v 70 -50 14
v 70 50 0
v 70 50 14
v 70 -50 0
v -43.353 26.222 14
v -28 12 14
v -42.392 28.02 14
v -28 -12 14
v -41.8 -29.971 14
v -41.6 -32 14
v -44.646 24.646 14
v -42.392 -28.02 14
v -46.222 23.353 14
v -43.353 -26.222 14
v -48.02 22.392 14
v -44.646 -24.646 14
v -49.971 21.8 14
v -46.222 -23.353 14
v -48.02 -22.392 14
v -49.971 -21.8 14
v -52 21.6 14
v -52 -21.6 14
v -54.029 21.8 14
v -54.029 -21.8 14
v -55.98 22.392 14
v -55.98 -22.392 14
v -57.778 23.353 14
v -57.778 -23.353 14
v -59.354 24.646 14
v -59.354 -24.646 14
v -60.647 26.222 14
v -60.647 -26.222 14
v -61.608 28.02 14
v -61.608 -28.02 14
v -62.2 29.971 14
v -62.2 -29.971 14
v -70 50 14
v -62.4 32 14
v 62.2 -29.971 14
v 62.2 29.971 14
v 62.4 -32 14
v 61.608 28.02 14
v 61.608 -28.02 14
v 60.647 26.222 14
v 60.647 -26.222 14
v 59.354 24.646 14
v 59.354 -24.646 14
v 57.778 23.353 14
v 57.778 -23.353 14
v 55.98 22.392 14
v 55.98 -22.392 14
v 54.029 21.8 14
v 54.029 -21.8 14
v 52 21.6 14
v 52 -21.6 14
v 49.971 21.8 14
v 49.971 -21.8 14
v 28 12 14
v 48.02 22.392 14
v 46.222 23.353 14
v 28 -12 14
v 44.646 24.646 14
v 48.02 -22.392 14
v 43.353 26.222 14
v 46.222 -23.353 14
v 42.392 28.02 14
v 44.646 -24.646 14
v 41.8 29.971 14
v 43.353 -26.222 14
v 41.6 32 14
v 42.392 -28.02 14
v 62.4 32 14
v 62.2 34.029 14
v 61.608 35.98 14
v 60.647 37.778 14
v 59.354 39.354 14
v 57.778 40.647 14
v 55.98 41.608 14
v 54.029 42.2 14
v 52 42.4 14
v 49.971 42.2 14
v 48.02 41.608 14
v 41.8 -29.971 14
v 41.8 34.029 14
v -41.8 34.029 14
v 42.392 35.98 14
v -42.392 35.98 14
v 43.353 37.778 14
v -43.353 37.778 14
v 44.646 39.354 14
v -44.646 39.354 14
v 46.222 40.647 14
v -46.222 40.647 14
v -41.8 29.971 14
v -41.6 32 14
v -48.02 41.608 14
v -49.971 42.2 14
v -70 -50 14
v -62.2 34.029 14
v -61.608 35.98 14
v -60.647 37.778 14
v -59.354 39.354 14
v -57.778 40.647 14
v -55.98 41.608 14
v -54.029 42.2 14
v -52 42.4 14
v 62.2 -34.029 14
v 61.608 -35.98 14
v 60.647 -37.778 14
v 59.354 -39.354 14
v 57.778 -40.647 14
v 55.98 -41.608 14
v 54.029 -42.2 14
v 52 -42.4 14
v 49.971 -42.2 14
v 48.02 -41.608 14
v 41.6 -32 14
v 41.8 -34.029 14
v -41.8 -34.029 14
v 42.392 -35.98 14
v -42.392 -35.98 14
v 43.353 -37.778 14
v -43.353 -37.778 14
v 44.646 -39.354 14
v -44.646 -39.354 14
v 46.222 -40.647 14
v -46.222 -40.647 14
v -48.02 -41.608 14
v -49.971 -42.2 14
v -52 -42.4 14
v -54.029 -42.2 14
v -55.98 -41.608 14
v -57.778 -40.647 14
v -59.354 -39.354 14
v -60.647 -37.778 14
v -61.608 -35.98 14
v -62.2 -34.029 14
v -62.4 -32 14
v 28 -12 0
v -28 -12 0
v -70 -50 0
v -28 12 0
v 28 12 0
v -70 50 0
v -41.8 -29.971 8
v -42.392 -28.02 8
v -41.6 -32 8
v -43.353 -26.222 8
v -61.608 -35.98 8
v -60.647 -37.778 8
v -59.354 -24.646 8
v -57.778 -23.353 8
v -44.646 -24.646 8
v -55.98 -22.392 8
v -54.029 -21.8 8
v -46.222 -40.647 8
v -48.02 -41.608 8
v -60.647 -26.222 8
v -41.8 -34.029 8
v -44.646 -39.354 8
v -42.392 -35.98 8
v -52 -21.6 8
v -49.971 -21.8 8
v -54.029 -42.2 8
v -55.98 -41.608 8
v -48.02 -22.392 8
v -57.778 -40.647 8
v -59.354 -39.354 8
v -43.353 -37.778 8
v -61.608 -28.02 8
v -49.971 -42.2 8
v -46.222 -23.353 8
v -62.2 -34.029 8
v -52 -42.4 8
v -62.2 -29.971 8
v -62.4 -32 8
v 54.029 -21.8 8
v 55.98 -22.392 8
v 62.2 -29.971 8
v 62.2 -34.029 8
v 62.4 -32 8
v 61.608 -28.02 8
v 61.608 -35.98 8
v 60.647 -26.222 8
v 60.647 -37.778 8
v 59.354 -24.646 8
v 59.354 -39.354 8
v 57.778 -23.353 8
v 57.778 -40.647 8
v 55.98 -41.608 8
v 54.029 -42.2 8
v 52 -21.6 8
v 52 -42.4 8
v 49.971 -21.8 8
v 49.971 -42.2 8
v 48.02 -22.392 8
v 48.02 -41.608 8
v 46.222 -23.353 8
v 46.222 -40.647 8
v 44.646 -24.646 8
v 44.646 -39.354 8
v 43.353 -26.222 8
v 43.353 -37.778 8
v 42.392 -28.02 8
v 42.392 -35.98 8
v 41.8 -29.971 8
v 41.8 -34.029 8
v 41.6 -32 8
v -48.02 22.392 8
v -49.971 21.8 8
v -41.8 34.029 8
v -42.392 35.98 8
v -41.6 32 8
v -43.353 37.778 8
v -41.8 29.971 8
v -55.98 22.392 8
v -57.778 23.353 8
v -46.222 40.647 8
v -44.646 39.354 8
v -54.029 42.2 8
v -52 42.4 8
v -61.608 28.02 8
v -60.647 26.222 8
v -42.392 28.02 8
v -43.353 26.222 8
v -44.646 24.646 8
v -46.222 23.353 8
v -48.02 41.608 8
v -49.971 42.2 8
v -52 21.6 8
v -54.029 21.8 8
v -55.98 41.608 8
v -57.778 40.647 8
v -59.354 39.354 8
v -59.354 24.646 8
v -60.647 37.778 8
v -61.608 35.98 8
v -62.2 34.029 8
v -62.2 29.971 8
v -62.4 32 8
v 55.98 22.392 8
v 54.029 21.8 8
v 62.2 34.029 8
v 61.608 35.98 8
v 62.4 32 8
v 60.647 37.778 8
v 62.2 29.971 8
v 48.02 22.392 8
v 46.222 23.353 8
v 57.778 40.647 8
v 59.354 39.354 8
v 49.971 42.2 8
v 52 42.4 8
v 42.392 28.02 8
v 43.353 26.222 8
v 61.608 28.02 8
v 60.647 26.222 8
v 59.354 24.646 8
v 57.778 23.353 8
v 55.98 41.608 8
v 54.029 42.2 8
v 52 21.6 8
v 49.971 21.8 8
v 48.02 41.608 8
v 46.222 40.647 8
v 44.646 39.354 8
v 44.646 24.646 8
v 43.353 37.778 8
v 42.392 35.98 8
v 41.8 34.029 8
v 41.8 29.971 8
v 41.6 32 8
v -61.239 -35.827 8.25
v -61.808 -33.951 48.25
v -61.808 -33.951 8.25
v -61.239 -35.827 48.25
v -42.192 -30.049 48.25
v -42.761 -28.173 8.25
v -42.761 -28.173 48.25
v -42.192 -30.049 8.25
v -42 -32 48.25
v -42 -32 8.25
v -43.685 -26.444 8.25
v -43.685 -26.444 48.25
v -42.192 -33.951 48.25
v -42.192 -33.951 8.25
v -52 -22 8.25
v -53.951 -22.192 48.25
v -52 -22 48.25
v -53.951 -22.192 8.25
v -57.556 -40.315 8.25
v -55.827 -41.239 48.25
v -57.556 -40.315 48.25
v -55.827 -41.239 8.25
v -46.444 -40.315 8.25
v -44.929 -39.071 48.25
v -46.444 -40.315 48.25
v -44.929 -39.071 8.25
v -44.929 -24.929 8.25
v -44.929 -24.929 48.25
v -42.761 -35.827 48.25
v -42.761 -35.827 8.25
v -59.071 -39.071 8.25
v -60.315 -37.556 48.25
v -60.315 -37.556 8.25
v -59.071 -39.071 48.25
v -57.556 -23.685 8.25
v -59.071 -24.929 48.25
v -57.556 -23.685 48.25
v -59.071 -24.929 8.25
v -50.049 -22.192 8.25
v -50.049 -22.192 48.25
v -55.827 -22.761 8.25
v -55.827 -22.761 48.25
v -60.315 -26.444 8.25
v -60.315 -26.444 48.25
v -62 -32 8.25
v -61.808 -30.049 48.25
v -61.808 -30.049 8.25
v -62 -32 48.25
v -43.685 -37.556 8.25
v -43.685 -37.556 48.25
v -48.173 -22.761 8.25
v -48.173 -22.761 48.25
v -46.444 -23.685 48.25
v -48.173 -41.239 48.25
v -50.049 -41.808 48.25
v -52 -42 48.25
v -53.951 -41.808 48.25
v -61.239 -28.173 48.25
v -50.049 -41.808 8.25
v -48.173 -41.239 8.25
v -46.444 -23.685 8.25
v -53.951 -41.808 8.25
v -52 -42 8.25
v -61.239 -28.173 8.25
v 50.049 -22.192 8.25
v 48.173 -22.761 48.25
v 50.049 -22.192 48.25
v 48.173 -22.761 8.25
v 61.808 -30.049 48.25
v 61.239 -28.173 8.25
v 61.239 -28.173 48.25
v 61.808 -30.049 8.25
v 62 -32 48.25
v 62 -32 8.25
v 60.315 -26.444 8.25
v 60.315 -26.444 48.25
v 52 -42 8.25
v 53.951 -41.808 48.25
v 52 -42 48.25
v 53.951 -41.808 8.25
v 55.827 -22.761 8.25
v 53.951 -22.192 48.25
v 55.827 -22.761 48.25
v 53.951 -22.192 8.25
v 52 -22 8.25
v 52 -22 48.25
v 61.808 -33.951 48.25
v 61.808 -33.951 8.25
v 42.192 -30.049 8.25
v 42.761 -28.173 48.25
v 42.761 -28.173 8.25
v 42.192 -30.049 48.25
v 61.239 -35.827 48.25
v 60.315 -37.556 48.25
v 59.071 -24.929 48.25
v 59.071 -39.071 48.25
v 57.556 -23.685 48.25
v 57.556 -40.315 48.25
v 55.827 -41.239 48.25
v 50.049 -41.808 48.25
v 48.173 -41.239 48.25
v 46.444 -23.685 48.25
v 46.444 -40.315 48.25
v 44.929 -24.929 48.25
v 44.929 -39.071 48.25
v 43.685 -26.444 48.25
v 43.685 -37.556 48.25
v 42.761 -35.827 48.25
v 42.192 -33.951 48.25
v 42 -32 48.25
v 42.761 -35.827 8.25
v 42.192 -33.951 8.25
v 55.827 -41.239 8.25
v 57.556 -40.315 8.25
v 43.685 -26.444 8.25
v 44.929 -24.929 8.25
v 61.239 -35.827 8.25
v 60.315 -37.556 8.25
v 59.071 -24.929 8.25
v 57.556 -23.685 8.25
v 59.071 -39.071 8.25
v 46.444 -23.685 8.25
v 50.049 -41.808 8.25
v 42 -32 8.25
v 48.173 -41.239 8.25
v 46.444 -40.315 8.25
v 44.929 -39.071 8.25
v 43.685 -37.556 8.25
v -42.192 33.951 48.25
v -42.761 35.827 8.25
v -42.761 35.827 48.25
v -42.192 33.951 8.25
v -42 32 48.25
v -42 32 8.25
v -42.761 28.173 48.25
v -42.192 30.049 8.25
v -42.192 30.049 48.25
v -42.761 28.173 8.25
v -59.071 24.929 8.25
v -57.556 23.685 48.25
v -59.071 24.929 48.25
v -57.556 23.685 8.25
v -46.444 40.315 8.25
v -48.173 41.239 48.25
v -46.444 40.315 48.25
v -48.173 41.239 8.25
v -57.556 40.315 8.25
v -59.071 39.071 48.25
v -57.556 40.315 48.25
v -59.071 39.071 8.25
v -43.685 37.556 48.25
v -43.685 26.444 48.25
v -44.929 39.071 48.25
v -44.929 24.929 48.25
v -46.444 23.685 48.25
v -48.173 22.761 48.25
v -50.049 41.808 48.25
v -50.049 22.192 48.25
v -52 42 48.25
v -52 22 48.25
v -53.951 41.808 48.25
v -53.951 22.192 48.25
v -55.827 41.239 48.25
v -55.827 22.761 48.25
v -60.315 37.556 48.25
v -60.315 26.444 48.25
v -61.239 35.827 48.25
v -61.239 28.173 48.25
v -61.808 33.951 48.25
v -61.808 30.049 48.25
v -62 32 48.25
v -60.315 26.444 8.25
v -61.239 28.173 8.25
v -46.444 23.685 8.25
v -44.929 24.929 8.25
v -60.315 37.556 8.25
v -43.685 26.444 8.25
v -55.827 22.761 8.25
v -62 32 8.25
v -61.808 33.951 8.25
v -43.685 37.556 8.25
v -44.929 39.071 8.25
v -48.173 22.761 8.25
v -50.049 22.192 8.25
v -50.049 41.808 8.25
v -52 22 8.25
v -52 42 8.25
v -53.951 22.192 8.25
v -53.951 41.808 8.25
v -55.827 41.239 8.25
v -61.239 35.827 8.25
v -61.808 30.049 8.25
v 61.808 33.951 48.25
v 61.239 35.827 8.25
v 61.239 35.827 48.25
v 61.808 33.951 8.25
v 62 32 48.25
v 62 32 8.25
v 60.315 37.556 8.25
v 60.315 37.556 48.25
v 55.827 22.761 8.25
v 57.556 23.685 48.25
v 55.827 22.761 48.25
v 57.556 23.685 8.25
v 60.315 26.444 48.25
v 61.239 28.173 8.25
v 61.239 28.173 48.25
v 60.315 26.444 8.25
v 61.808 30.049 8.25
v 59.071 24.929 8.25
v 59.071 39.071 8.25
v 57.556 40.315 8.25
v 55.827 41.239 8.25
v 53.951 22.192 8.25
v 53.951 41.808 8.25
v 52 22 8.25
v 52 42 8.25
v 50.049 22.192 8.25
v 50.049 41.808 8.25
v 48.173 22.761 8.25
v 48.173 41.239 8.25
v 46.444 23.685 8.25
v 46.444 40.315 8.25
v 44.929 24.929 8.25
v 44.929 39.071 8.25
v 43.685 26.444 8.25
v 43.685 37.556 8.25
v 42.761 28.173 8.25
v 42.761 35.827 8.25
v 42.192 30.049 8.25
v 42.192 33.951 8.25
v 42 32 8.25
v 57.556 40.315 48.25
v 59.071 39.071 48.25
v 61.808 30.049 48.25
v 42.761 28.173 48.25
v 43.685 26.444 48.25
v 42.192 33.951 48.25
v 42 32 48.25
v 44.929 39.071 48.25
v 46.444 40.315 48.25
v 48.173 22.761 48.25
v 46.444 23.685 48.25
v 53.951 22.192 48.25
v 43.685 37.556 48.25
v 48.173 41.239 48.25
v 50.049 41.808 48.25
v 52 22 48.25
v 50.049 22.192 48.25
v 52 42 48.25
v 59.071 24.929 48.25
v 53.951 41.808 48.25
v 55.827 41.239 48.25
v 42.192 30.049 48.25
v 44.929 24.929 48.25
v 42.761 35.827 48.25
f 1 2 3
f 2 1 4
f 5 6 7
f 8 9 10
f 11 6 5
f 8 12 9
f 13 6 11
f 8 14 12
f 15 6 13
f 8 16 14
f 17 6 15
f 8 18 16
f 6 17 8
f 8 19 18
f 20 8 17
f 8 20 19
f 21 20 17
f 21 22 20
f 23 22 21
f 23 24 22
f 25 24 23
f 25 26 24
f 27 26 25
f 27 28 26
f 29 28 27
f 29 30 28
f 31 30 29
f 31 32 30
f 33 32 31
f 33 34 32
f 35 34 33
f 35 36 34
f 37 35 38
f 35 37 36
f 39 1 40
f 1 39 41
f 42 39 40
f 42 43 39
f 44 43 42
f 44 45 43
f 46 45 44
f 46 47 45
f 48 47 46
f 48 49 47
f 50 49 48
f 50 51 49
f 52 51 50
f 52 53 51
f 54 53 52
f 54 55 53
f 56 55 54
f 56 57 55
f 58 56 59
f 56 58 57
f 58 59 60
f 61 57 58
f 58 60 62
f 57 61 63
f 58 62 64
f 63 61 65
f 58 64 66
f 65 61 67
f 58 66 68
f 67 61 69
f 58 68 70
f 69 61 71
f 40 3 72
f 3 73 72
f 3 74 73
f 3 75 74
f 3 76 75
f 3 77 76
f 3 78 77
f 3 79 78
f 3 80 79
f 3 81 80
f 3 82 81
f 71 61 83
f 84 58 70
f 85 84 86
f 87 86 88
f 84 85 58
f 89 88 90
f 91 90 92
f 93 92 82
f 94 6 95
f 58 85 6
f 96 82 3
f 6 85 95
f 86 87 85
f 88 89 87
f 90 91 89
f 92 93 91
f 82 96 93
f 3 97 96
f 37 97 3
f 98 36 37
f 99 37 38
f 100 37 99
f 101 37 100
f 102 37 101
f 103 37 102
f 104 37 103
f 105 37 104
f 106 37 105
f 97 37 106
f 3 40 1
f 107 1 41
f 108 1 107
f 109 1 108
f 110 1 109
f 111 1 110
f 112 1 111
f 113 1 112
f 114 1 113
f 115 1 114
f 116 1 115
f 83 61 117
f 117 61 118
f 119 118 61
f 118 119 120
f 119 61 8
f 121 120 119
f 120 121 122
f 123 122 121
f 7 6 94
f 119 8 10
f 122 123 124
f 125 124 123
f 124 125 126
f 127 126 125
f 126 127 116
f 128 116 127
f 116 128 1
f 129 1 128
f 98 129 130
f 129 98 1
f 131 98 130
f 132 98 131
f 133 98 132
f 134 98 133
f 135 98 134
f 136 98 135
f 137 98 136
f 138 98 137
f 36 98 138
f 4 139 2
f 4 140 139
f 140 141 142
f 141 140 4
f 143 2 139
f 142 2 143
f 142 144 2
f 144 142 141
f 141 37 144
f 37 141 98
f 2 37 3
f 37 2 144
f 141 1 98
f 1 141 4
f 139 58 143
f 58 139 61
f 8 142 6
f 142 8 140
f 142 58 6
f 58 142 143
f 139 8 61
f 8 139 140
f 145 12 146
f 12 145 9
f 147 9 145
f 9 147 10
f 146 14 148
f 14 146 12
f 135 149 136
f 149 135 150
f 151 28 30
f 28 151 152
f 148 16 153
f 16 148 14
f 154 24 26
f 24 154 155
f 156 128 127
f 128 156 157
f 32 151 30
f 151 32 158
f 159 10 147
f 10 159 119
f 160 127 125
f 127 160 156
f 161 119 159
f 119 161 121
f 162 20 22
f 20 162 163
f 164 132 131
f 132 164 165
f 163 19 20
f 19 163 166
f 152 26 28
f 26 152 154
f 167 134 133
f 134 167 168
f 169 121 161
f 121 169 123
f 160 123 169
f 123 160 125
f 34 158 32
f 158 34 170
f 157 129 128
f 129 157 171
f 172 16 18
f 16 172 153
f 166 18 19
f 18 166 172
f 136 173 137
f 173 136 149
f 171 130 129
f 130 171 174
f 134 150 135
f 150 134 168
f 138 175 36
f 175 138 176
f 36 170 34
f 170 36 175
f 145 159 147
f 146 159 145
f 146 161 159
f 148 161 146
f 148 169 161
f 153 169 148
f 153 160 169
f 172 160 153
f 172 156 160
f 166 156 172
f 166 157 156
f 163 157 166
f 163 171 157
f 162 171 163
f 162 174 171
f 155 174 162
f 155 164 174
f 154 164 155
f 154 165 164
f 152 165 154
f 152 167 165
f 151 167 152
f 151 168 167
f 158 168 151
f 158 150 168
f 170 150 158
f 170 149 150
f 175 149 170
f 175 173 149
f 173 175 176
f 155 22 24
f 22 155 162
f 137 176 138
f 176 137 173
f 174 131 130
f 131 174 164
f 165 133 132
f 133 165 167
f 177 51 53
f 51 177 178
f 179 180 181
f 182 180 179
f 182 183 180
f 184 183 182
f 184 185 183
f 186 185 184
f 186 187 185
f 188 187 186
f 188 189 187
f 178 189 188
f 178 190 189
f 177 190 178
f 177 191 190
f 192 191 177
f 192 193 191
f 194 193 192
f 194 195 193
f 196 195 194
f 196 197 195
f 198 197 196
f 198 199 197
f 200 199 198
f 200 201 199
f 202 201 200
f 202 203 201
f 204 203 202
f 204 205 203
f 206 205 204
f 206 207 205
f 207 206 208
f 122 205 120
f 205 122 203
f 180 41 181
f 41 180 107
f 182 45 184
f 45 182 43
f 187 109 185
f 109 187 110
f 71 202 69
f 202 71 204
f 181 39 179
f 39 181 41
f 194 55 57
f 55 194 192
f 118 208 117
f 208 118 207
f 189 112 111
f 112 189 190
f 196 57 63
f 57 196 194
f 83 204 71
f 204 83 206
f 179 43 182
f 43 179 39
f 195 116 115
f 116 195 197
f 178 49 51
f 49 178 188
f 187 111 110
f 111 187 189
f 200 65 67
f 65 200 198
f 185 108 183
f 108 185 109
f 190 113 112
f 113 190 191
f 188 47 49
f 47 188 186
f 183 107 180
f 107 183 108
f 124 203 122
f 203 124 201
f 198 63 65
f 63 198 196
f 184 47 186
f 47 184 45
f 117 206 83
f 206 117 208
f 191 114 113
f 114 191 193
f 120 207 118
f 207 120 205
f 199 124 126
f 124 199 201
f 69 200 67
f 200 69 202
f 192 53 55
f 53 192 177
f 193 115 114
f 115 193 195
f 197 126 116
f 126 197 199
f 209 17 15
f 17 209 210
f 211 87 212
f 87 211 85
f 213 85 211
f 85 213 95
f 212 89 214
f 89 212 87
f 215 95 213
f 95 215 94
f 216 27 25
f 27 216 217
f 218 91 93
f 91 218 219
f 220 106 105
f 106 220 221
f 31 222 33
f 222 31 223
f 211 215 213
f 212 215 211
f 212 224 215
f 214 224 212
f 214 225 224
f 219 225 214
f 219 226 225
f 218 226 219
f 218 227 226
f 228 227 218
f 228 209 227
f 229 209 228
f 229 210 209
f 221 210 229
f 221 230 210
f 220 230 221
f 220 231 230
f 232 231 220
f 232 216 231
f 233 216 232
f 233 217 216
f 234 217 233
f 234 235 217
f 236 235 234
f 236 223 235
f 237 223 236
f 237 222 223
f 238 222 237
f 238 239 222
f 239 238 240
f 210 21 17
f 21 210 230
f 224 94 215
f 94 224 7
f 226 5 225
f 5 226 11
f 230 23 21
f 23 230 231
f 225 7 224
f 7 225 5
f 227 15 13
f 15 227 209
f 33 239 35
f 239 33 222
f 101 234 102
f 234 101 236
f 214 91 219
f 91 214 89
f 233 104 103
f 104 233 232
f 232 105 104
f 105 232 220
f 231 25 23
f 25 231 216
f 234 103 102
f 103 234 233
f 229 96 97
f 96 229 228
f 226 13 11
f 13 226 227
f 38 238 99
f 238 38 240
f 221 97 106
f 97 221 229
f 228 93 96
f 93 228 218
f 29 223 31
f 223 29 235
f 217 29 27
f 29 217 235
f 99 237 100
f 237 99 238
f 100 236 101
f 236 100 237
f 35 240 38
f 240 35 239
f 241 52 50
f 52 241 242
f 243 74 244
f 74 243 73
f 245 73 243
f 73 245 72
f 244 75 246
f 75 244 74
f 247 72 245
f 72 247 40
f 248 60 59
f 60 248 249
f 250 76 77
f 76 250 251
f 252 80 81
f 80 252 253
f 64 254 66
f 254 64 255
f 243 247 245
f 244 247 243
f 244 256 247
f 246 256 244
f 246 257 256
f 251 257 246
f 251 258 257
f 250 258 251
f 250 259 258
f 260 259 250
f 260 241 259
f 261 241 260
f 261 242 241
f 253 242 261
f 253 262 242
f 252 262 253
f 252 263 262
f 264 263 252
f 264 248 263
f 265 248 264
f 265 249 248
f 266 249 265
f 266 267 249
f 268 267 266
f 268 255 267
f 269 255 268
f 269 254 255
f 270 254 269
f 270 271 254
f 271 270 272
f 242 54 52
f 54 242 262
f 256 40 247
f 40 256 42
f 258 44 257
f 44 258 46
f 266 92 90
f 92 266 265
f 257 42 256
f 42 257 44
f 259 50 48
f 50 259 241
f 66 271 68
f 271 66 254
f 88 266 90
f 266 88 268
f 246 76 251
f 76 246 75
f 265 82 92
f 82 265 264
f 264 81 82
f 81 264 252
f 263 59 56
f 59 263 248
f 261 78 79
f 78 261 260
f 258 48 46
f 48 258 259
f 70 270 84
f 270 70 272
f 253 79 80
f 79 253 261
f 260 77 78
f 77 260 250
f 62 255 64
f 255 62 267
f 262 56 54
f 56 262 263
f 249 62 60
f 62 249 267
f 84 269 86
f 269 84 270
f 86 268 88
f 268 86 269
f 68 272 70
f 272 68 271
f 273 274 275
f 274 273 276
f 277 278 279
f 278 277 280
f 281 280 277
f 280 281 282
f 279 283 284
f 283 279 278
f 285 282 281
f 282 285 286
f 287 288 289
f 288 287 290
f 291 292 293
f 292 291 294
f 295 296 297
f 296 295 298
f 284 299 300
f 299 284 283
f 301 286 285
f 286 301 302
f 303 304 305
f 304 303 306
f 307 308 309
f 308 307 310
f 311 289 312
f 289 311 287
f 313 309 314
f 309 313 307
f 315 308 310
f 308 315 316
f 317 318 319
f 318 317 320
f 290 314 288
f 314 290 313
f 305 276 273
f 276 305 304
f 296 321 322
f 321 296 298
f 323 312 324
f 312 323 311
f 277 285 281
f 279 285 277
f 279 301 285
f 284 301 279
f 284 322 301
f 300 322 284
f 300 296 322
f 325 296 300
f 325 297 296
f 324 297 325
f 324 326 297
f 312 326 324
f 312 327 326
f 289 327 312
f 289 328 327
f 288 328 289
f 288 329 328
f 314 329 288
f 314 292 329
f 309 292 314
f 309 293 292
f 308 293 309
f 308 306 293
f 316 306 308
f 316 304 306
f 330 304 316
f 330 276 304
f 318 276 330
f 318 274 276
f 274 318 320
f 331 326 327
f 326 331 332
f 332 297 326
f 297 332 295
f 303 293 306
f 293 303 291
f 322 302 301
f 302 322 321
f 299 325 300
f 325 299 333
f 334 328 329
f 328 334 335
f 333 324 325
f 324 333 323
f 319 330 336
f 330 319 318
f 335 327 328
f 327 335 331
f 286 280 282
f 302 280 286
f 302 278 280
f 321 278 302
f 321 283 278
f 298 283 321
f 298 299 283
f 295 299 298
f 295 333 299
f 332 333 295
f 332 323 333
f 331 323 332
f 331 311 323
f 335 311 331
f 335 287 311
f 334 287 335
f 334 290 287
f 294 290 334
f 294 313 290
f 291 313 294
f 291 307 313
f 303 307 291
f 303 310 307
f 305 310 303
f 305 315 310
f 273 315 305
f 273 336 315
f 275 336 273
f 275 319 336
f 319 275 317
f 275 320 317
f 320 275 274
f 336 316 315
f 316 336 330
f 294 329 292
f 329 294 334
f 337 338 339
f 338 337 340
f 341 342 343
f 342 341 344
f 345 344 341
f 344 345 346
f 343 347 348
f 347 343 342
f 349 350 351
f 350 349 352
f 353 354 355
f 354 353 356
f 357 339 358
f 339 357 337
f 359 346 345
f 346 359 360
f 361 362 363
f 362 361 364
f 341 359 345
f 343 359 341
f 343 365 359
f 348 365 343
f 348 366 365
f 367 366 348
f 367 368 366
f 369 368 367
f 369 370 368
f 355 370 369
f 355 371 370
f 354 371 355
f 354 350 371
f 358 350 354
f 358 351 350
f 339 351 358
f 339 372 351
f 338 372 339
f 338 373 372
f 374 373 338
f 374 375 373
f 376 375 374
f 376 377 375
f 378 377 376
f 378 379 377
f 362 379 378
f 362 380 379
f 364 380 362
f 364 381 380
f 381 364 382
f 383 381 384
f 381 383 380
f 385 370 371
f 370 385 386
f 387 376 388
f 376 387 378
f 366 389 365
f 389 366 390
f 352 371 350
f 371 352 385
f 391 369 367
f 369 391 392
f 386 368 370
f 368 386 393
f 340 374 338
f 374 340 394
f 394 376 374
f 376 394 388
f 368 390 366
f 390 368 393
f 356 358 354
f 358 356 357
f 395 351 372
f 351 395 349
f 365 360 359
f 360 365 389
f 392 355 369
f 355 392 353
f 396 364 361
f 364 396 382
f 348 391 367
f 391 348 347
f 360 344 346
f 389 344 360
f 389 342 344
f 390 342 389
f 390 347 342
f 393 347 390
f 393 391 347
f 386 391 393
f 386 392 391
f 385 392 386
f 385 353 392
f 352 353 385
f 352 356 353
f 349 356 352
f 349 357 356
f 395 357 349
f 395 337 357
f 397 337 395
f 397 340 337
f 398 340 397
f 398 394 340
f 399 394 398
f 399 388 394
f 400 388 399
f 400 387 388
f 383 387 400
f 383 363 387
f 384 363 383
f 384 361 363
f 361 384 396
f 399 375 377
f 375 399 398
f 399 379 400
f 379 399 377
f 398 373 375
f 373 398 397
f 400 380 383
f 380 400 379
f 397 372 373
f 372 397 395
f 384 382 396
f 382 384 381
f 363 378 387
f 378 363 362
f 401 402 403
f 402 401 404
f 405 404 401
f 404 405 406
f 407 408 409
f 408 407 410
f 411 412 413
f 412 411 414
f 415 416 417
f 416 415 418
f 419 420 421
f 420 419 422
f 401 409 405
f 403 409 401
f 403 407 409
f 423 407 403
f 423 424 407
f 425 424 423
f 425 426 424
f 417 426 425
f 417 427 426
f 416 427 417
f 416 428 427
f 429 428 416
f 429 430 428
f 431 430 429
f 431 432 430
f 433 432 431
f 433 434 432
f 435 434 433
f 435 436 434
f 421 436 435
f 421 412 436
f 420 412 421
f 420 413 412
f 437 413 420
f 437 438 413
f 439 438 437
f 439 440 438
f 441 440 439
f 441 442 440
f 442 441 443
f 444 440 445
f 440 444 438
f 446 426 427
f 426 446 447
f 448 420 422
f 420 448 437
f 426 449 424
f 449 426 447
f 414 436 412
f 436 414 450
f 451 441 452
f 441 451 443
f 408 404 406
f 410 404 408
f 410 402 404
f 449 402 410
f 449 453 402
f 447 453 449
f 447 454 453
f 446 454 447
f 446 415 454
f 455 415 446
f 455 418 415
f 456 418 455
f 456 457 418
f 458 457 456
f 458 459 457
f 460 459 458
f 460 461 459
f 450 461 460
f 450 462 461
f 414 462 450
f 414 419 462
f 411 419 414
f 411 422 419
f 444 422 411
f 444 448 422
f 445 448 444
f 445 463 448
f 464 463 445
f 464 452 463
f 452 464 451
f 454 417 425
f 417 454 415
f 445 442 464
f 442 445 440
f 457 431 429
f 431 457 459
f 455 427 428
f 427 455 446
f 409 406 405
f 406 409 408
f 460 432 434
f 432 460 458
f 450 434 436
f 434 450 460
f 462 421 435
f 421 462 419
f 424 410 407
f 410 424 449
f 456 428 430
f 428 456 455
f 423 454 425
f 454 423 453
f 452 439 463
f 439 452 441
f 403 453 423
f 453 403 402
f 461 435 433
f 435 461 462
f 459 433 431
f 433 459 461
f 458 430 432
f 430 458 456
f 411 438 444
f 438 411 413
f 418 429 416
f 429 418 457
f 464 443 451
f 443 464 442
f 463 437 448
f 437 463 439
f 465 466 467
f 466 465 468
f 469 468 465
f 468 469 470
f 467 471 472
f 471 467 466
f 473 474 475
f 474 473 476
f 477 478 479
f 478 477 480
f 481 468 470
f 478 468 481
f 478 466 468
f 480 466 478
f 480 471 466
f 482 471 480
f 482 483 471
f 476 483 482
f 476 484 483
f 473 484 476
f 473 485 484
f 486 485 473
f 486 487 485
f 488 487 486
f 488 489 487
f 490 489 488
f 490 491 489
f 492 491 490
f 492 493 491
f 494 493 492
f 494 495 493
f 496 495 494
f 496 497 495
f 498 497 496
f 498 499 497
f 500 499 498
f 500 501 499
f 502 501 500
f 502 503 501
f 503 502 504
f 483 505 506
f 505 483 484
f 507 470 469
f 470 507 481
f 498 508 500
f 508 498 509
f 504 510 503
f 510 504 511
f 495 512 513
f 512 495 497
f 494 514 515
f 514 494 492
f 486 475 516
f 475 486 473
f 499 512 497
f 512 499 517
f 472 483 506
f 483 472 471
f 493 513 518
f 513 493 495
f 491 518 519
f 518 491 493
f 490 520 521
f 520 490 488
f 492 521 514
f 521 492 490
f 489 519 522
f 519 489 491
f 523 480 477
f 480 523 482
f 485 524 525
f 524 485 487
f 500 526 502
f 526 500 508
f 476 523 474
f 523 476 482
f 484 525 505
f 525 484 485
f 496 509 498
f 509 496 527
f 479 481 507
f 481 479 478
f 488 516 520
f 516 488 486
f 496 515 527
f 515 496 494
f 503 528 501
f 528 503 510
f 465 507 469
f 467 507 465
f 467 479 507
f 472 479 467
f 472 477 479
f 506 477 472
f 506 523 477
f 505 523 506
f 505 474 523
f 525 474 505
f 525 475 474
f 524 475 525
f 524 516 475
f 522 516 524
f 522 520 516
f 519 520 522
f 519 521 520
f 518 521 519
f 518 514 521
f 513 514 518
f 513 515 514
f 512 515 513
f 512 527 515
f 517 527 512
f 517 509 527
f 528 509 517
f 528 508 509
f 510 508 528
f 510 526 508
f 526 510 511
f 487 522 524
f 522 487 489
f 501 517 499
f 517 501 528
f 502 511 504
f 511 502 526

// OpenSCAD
$fn = 32;

// ------------------------------------------------------------------------
// Frame with four posts: 140 x 100 mm frame, four d20 posts
// Every part is its own module, assembly() places them once.
// ------------------------------------------------------------------------

// --- part 1 ---
module base_frame() {
  difference() {
    translate([-70, -50, 0]) cube([140, 100, 14]);
    translate([-28, -12, -1]) cube([56, 24, 16]);
    translate([-52, -32, 8]) cylinder(h = 7, d = 20.8);
    translate([52, -32, 8]) cylinder(h = 7, d = 20.8);
    translate([-52, 32, 8]) cylinder(h = 7, d = 20.8);
    translate([52, 32, 8]) cylinder(h = 7, d = 20.8);
  }
}

// --- part 2 ---
module post1() {
  cylinder(h = 40, d = 20);
}

// --- part 3 ---
module post2() {
  cylinder(h = 40, d = 20);
}

// --- part 4 ---
module post3() {
  cylinder(h = 40, d = 20);
}

// --- part 5 ---
module post4() {
  cylinder(h = 40, d = 20);
}

// --- assembly ---
module assembly() {
  translate([0, 0, 0]) rotate([0, 0, 0]) base_frame();
  translate([-52, -32, 8.25]) rotate([0, 0, 0]) post1();
  translate([52, -32, 8.25]) rotate([0, 0, 0]) post2();
  translate([-52, 32, 8.25]) rotate([0, 0, 0]) post3();
  translate([52, 32, 8.25]) rotate([0, 0, 0]) post4();
}

assembly();
